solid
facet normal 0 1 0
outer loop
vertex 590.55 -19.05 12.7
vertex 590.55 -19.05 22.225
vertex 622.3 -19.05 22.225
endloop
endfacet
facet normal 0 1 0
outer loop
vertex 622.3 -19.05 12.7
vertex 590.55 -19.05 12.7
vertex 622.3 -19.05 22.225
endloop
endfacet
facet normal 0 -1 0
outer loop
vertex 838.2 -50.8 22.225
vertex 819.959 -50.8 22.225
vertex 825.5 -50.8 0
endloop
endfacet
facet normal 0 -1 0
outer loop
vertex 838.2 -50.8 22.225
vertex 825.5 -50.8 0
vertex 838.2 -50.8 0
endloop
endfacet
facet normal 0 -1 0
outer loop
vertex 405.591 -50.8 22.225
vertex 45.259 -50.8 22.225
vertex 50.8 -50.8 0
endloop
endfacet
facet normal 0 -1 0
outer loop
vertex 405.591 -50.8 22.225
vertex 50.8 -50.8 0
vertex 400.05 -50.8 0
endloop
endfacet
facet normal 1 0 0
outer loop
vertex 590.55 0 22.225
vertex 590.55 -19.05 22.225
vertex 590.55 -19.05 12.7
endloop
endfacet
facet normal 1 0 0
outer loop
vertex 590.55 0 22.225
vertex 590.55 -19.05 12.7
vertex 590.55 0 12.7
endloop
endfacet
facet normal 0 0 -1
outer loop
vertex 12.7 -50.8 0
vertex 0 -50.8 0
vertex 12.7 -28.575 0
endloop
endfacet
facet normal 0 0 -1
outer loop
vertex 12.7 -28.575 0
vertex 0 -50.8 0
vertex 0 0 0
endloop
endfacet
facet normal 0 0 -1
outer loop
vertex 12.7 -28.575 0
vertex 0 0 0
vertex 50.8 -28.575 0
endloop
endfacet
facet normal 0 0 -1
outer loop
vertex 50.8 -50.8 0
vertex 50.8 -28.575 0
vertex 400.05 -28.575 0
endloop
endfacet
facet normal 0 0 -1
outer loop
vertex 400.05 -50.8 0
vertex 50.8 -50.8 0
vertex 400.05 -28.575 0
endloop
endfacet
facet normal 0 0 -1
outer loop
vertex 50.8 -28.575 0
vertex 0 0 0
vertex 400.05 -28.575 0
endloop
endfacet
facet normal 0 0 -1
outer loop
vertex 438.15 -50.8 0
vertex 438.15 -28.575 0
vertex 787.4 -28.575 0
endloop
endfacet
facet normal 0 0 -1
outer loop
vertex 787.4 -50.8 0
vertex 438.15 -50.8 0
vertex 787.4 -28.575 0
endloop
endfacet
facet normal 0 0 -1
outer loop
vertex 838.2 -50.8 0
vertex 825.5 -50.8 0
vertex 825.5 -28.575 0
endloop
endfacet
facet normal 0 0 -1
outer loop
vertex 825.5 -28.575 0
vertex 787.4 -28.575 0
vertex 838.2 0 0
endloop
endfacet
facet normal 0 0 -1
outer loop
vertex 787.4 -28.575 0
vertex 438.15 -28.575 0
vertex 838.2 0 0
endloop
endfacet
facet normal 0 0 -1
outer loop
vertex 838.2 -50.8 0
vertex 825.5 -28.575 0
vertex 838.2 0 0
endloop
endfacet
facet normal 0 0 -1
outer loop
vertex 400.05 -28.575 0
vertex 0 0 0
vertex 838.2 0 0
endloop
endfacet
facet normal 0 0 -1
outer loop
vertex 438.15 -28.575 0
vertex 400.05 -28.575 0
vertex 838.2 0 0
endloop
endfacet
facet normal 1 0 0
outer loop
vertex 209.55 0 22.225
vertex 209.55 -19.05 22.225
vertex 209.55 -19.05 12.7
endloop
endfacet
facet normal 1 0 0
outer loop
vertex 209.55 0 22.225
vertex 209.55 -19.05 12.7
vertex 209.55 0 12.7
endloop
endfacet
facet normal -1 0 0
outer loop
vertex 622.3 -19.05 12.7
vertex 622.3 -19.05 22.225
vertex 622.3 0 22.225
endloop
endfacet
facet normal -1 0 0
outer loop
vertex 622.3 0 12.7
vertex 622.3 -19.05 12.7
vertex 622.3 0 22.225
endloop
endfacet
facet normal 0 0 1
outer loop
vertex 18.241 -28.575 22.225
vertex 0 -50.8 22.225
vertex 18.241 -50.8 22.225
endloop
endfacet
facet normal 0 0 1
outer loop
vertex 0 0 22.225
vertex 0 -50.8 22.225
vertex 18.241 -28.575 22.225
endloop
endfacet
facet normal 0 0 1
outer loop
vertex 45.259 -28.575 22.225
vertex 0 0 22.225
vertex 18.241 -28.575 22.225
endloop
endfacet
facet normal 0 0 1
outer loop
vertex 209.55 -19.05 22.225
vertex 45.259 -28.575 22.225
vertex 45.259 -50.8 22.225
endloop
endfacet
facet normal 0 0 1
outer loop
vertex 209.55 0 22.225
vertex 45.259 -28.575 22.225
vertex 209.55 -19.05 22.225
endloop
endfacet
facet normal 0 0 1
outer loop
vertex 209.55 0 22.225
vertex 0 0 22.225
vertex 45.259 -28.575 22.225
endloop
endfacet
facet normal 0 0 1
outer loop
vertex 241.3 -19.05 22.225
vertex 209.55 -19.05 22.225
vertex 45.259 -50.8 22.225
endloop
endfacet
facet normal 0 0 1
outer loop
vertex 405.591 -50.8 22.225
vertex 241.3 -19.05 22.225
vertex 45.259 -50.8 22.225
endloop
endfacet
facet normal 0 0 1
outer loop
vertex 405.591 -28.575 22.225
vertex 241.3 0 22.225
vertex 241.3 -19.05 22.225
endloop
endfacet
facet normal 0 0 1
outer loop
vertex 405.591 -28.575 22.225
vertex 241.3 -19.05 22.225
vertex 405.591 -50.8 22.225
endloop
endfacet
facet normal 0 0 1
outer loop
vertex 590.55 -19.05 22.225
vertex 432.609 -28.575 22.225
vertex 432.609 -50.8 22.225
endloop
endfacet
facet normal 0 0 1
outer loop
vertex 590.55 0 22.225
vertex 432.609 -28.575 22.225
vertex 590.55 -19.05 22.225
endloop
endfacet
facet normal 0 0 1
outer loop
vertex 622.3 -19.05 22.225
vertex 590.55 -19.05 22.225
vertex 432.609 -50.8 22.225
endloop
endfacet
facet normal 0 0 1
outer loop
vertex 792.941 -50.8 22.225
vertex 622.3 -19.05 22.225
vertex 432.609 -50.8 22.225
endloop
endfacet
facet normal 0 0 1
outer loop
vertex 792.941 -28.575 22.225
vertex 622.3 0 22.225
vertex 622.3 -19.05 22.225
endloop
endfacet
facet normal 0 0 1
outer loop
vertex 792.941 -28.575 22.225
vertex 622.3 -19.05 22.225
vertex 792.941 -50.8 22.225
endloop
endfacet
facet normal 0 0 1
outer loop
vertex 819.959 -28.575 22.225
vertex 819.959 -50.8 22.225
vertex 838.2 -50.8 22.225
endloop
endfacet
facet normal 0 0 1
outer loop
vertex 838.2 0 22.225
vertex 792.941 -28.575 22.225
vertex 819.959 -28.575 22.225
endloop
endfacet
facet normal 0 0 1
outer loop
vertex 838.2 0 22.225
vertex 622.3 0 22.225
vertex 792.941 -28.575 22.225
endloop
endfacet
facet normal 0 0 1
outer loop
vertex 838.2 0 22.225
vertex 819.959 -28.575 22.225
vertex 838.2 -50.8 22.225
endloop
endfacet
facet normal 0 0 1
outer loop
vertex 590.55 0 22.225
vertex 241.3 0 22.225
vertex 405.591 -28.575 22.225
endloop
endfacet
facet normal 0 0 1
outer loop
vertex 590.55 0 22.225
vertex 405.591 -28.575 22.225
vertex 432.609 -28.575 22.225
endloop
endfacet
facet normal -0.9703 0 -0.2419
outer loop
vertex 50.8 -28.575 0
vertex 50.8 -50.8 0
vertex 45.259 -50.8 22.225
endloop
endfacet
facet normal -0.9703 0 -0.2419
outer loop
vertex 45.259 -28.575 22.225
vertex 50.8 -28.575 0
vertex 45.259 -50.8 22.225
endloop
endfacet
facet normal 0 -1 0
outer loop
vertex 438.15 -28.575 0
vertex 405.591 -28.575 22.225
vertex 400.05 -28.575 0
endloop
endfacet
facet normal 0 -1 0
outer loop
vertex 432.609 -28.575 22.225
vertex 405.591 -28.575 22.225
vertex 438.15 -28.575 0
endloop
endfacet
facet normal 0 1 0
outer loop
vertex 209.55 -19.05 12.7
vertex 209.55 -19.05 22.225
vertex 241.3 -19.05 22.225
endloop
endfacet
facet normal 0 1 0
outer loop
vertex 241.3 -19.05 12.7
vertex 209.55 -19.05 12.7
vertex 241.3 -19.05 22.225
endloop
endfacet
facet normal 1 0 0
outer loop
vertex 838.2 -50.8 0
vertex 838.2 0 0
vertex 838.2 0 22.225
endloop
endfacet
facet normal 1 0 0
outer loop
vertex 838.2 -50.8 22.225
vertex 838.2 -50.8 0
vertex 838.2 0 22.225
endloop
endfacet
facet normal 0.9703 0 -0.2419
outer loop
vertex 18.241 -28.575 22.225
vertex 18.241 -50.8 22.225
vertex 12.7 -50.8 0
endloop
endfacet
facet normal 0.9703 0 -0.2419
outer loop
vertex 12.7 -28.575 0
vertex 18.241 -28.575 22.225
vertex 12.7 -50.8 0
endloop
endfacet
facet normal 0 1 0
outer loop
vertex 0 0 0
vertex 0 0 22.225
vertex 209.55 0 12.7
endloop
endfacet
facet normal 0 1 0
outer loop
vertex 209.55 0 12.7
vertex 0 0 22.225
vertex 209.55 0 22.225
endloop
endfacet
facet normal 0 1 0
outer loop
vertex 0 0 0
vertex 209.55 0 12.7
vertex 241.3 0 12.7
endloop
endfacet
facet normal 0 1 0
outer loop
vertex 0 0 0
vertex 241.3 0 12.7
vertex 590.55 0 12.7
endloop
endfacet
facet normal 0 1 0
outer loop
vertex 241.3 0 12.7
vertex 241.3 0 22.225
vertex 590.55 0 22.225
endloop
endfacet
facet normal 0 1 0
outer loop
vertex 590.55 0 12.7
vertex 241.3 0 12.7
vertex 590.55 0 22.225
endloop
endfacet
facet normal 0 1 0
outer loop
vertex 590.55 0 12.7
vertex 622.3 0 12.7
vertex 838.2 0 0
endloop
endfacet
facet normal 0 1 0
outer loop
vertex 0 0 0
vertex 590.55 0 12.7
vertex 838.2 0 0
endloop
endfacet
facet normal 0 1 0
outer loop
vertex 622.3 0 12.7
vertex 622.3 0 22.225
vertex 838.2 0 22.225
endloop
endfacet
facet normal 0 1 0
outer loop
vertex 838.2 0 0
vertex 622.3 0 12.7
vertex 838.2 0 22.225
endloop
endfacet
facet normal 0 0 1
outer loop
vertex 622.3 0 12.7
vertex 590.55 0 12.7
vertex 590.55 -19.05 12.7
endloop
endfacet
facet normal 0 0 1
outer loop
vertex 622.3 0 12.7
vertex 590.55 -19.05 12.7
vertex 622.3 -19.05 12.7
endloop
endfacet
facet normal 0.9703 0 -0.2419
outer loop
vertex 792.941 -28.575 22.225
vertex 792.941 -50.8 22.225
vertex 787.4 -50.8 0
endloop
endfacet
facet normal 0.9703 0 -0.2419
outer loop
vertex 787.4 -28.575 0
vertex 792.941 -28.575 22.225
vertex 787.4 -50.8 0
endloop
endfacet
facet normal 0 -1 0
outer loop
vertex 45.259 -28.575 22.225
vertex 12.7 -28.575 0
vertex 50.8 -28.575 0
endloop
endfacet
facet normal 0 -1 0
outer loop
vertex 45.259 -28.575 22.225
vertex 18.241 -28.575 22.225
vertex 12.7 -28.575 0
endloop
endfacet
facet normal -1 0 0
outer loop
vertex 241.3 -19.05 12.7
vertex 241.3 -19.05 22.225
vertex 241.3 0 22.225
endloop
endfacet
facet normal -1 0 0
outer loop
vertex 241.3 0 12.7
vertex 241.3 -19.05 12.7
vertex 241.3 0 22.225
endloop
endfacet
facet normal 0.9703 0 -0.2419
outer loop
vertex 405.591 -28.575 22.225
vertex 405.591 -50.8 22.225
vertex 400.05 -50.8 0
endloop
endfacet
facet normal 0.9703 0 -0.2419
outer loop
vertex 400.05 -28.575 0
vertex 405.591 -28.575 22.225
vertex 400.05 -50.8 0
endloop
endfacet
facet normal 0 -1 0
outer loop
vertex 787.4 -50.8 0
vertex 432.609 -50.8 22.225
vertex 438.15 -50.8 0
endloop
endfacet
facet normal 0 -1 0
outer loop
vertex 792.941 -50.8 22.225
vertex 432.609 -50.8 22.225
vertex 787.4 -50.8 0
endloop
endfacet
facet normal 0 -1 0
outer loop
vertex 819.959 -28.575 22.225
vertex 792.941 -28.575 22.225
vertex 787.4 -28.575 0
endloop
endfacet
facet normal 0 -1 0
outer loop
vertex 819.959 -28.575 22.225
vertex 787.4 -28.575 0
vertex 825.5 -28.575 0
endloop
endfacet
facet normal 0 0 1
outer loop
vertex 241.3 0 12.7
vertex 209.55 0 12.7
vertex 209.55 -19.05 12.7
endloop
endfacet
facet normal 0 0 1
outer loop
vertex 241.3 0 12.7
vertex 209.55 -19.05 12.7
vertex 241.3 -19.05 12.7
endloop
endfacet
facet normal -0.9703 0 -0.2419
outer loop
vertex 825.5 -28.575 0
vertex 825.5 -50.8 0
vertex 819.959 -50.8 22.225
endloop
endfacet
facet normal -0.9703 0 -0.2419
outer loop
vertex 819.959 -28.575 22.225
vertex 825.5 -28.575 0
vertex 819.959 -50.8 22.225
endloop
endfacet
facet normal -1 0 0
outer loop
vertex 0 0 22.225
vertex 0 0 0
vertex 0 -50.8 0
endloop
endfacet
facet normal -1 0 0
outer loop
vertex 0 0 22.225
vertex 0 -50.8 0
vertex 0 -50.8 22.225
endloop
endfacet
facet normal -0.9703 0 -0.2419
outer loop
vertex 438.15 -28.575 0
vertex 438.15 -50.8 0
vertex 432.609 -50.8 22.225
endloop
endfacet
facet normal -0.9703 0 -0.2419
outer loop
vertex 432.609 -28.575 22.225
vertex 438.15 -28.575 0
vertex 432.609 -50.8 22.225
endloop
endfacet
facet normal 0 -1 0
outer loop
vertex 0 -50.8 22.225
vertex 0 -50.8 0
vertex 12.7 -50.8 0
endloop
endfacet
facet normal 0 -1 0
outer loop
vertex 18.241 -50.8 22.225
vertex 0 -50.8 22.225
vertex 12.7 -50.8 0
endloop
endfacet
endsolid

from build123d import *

# Parameters (mm, degrees)
F0_W     = 838.2
F0_H     = 22.225
F1_DEPTH = 50.8
F3_DEPTH = 22.225
F4_W     = 31.75
F4_H     = 19.05
F5_DEPTH = 9.525


with BuildPart() as f1:
    # F0 (on Front) → F1 (new body)
    with BuildSketch(Plane.XZ):
        with Locations((419.1, 11.1125)):
            Rectangle(F0_W, F0_H)
    extrude(amount=F1_DEPTH)

    # F2 (on face) → F3 (cut)
    with BuildSketch(Plane.XZ.offset(50.8)):
        Polygon((405.591315, 22.225), (400.05, 0), (438.15, 0), (432.608685, 22.225), align=None)
        Polygon((792.941315, 22.225), (787.4, 0), (825.5, 0), (819.958685, 22.225), align=None)
        Polygon((12.7, 0), (50.8, 0), (45.258685, 22.225), (18.241315, 22.225), align=None)
    extrude(amount=-F3_DEPTH, mode=Mode.SUBTRACT)

    # F4 (on face) → F5 (cut)
    with BuildSketch(Plane.XY.offset(22.225)):
        with Locations((225.425, -9.525)):
            Rectangle(F4_W, F4_H)
        with Locations((606.425, -9.525)):
            Rectangle(F4_W, F4_H)
    extrude(amount=-F5_DEPTH, mode=Mode.SUBTRACT)


solid = f1.part
